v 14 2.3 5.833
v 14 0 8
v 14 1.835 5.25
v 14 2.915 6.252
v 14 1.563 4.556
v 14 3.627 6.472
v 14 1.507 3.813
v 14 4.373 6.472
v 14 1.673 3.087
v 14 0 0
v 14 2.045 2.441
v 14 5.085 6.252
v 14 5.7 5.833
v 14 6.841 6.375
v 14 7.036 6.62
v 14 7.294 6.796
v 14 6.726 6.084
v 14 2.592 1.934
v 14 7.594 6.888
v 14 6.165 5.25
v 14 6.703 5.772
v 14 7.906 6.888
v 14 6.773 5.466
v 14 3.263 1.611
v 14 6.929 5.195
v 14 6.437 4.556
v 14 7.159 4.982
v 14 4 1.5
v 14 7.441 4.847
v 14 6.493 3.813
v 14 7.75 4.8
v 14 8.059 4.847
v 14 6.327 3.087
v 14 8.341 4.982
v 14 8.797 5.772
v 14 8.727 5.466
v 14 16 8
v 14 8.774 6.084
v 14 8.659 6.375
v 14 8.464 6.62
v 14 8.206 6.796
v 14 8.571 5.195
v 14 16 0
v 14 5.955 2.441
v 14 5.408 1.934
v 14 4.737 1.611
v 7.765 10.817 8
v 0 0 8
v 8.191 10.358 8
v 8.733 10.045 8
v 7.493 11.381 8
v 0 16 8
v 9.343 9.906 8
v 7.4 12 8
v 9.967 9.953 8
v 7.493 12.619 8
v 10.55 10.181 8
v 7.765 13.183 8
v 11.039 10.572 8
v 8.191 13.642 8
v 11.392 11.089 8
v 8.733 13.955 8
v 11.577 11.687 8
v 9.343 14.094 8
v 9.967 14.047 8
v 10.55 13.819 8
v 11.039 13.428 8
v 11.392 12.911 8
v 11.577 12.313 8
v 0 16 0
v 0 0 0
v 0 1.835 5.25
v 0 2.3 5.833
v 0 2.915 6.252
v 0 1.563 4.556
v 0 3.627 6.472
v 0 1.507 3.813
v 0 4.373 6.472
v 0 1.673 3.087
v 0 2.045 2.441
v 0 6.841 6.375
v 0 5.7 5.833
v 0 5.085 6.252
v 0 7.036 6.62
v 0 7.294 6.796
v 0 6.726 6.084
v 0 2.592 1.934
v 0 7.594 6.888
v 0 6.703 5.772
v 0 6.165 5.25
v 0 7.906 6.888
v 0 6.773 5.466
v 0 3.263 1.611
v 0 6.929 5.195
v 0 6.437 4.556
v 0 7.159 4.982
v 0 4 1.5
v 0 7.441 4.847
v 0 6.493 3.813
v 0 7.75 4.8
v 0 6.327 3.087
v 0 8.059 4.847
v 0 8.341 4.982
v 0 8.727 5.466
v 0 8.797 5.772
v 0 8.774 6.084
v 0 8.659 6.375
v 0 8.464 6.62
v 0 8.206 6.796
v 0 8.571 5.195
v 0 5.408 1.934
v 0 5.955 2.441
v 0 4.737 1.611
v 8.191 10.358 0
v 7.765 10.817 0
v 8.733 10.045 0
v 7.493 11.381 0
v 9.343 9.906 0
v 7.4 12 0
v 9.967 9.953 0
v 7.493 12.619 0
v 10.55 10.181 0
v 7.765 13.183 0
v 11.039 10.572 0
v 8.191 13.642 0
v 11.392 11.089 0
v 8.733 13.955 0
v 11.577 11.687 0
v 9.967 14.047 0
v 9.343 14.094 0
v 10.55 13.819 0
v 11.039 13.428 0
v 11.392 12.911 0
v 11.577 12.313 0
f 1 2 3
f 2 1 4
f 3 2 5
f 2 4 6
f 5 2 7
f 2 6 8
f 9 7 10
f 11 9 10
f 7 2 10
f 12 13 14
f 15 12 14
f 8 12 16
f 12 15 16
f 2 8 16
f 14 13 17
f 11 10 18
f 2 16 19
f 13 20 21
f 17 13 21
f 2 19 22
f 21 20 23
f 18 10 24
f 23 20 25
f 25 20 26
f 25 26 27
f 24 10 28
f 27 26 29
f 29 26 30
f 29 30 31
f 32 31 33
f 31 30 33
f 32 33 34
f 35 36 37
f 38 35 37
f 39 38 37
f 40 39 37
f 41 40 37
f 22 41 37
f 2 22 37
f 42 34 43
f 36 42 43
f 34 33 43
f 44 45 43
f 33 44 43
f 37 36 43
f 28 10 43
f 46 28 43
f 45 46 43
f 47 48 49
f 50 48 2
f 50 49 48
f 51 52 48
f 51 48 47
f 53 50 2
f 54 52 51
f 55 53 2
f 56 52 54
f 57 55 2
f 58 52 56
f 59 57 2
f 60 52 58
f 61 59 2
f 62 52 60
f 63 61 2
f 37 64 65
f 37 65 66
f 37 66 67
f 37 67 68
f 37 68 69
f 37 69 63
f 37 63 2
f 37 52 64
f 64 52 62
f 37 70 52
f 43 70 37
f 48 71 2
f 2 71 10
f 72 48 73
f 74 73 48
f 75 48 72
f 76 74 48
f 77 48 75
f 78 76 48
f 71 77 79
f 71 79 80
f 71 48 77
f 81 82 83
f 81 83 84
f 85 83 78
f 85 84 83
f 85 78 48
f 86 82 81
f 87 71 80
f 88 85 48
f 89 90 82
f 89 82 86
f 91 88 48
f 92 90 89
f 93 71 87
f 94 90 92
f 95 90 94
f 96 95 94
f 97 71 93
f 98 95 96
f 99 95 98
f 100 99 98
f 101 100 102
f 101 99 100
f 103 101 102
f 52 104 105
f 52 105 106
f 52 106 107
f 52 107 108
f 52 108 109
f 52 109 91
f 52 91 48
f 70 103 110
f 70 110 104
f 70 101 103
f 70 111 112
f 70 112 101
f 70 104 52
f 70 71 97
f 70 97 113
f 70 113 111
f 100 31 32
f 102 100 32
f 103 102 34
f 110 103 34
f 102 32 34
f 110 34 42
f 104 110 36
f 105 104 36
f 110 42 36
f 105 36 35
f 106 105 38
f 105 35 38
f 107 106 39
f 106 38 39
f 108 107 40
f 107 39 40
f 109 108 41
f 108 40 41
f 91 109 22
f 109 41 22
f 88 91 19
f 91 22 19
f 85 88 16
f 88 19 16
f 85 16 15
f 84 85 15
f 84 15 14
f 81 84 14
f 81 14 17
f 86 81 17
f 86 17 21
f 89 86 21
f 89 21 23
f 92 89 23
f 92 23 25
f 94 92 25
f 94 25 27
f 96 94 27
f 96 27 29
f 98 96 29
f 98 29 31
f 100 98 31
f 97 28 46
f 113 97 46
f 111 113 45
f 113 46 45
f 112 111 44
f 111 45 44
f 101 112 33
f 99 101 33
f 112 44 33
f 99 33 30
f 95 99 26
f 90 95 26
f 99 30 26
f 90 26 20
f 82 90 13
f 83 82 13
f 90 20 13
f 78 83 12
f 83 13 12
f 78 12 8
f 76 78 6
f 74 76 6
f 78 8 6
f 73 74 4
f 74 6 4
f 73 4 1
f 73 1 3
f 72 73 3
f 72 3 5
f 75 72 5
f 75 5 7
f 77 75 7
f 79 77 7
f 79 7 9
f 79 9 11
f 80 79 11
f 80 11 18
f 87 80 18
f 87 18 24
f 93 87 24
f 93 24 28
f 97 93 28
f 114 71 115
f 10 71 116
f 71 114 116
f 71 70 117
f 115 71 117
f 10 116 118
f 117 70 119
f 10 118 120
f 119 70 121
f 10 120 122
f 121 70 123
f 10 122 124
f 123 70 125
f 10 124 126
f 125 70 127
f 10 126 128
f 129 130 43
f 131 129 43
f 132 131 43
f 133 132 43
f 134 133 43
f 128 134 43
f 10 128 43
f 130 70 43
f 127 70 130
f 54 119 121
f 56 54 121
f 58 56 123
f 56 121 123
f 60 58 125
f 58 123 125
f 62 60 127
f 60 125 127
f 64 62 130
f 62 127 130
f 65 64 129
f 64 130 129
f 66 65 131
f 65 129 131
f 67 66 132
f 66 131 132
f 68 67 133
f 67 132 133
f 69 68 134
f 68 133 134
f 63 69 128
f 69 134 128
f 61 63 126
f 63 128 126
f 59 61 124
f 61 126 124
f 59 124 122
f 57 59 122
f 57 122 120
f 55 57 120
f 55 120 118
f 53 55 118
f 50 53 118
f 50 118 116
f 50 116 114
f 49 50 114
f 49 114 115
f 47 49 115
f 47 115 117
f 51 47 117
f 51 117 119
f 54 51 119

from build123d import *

# Parameters (mm, degrees)
SKETCH1_W                   = 14
SKETCH1_H                   = 16
BOSS_EXTRUDE1_DEPTH         = 8
TAP_DRILL_FOR_M5X0_8_TAP1_D = 4.2
F_5_0_5_DIAMETER_HOLE1_D    = 5
F_2_1_2_1_DIAMETER_HOLE1_D  = 2.1


with BuildPart() as part:
    # Sketch1 → Boss-Extrude1 (new body)
    with BuildSketch(Plane.XY):
        with Locations((7, 8)):
            Rectangle(SKETCH1_W, SKETCH1_H)
    extrude(amount=BOSS_EXTRUDE1_DEPTH)

    # Tap Drill for M5x0.8 Tap1 (through all)
    with Locations(Plane.XY.offset(8)):
        with Locations((9.5, 12)):
            Hole(TAP_DRILL_FOR_M5X0_8_TAP1_D / 2)

    # Ø5.0 (5) Diameter Hole1 (through all)
    with Locations(Plane.ZY):
        with Locations((4, 4)):
            Hole(F_5_0_5_DIAMETER_HOLE1_D / 2)

    # Ø2.1 (2.1) Diameter Hole1 (through all)
    with Locations(Plane.ZY):
        with Locations((5.85, 7.75)):
            Hole(F_2_1_2_1_DIAMETER_HOLE1_D / 2)


solid = part.part
